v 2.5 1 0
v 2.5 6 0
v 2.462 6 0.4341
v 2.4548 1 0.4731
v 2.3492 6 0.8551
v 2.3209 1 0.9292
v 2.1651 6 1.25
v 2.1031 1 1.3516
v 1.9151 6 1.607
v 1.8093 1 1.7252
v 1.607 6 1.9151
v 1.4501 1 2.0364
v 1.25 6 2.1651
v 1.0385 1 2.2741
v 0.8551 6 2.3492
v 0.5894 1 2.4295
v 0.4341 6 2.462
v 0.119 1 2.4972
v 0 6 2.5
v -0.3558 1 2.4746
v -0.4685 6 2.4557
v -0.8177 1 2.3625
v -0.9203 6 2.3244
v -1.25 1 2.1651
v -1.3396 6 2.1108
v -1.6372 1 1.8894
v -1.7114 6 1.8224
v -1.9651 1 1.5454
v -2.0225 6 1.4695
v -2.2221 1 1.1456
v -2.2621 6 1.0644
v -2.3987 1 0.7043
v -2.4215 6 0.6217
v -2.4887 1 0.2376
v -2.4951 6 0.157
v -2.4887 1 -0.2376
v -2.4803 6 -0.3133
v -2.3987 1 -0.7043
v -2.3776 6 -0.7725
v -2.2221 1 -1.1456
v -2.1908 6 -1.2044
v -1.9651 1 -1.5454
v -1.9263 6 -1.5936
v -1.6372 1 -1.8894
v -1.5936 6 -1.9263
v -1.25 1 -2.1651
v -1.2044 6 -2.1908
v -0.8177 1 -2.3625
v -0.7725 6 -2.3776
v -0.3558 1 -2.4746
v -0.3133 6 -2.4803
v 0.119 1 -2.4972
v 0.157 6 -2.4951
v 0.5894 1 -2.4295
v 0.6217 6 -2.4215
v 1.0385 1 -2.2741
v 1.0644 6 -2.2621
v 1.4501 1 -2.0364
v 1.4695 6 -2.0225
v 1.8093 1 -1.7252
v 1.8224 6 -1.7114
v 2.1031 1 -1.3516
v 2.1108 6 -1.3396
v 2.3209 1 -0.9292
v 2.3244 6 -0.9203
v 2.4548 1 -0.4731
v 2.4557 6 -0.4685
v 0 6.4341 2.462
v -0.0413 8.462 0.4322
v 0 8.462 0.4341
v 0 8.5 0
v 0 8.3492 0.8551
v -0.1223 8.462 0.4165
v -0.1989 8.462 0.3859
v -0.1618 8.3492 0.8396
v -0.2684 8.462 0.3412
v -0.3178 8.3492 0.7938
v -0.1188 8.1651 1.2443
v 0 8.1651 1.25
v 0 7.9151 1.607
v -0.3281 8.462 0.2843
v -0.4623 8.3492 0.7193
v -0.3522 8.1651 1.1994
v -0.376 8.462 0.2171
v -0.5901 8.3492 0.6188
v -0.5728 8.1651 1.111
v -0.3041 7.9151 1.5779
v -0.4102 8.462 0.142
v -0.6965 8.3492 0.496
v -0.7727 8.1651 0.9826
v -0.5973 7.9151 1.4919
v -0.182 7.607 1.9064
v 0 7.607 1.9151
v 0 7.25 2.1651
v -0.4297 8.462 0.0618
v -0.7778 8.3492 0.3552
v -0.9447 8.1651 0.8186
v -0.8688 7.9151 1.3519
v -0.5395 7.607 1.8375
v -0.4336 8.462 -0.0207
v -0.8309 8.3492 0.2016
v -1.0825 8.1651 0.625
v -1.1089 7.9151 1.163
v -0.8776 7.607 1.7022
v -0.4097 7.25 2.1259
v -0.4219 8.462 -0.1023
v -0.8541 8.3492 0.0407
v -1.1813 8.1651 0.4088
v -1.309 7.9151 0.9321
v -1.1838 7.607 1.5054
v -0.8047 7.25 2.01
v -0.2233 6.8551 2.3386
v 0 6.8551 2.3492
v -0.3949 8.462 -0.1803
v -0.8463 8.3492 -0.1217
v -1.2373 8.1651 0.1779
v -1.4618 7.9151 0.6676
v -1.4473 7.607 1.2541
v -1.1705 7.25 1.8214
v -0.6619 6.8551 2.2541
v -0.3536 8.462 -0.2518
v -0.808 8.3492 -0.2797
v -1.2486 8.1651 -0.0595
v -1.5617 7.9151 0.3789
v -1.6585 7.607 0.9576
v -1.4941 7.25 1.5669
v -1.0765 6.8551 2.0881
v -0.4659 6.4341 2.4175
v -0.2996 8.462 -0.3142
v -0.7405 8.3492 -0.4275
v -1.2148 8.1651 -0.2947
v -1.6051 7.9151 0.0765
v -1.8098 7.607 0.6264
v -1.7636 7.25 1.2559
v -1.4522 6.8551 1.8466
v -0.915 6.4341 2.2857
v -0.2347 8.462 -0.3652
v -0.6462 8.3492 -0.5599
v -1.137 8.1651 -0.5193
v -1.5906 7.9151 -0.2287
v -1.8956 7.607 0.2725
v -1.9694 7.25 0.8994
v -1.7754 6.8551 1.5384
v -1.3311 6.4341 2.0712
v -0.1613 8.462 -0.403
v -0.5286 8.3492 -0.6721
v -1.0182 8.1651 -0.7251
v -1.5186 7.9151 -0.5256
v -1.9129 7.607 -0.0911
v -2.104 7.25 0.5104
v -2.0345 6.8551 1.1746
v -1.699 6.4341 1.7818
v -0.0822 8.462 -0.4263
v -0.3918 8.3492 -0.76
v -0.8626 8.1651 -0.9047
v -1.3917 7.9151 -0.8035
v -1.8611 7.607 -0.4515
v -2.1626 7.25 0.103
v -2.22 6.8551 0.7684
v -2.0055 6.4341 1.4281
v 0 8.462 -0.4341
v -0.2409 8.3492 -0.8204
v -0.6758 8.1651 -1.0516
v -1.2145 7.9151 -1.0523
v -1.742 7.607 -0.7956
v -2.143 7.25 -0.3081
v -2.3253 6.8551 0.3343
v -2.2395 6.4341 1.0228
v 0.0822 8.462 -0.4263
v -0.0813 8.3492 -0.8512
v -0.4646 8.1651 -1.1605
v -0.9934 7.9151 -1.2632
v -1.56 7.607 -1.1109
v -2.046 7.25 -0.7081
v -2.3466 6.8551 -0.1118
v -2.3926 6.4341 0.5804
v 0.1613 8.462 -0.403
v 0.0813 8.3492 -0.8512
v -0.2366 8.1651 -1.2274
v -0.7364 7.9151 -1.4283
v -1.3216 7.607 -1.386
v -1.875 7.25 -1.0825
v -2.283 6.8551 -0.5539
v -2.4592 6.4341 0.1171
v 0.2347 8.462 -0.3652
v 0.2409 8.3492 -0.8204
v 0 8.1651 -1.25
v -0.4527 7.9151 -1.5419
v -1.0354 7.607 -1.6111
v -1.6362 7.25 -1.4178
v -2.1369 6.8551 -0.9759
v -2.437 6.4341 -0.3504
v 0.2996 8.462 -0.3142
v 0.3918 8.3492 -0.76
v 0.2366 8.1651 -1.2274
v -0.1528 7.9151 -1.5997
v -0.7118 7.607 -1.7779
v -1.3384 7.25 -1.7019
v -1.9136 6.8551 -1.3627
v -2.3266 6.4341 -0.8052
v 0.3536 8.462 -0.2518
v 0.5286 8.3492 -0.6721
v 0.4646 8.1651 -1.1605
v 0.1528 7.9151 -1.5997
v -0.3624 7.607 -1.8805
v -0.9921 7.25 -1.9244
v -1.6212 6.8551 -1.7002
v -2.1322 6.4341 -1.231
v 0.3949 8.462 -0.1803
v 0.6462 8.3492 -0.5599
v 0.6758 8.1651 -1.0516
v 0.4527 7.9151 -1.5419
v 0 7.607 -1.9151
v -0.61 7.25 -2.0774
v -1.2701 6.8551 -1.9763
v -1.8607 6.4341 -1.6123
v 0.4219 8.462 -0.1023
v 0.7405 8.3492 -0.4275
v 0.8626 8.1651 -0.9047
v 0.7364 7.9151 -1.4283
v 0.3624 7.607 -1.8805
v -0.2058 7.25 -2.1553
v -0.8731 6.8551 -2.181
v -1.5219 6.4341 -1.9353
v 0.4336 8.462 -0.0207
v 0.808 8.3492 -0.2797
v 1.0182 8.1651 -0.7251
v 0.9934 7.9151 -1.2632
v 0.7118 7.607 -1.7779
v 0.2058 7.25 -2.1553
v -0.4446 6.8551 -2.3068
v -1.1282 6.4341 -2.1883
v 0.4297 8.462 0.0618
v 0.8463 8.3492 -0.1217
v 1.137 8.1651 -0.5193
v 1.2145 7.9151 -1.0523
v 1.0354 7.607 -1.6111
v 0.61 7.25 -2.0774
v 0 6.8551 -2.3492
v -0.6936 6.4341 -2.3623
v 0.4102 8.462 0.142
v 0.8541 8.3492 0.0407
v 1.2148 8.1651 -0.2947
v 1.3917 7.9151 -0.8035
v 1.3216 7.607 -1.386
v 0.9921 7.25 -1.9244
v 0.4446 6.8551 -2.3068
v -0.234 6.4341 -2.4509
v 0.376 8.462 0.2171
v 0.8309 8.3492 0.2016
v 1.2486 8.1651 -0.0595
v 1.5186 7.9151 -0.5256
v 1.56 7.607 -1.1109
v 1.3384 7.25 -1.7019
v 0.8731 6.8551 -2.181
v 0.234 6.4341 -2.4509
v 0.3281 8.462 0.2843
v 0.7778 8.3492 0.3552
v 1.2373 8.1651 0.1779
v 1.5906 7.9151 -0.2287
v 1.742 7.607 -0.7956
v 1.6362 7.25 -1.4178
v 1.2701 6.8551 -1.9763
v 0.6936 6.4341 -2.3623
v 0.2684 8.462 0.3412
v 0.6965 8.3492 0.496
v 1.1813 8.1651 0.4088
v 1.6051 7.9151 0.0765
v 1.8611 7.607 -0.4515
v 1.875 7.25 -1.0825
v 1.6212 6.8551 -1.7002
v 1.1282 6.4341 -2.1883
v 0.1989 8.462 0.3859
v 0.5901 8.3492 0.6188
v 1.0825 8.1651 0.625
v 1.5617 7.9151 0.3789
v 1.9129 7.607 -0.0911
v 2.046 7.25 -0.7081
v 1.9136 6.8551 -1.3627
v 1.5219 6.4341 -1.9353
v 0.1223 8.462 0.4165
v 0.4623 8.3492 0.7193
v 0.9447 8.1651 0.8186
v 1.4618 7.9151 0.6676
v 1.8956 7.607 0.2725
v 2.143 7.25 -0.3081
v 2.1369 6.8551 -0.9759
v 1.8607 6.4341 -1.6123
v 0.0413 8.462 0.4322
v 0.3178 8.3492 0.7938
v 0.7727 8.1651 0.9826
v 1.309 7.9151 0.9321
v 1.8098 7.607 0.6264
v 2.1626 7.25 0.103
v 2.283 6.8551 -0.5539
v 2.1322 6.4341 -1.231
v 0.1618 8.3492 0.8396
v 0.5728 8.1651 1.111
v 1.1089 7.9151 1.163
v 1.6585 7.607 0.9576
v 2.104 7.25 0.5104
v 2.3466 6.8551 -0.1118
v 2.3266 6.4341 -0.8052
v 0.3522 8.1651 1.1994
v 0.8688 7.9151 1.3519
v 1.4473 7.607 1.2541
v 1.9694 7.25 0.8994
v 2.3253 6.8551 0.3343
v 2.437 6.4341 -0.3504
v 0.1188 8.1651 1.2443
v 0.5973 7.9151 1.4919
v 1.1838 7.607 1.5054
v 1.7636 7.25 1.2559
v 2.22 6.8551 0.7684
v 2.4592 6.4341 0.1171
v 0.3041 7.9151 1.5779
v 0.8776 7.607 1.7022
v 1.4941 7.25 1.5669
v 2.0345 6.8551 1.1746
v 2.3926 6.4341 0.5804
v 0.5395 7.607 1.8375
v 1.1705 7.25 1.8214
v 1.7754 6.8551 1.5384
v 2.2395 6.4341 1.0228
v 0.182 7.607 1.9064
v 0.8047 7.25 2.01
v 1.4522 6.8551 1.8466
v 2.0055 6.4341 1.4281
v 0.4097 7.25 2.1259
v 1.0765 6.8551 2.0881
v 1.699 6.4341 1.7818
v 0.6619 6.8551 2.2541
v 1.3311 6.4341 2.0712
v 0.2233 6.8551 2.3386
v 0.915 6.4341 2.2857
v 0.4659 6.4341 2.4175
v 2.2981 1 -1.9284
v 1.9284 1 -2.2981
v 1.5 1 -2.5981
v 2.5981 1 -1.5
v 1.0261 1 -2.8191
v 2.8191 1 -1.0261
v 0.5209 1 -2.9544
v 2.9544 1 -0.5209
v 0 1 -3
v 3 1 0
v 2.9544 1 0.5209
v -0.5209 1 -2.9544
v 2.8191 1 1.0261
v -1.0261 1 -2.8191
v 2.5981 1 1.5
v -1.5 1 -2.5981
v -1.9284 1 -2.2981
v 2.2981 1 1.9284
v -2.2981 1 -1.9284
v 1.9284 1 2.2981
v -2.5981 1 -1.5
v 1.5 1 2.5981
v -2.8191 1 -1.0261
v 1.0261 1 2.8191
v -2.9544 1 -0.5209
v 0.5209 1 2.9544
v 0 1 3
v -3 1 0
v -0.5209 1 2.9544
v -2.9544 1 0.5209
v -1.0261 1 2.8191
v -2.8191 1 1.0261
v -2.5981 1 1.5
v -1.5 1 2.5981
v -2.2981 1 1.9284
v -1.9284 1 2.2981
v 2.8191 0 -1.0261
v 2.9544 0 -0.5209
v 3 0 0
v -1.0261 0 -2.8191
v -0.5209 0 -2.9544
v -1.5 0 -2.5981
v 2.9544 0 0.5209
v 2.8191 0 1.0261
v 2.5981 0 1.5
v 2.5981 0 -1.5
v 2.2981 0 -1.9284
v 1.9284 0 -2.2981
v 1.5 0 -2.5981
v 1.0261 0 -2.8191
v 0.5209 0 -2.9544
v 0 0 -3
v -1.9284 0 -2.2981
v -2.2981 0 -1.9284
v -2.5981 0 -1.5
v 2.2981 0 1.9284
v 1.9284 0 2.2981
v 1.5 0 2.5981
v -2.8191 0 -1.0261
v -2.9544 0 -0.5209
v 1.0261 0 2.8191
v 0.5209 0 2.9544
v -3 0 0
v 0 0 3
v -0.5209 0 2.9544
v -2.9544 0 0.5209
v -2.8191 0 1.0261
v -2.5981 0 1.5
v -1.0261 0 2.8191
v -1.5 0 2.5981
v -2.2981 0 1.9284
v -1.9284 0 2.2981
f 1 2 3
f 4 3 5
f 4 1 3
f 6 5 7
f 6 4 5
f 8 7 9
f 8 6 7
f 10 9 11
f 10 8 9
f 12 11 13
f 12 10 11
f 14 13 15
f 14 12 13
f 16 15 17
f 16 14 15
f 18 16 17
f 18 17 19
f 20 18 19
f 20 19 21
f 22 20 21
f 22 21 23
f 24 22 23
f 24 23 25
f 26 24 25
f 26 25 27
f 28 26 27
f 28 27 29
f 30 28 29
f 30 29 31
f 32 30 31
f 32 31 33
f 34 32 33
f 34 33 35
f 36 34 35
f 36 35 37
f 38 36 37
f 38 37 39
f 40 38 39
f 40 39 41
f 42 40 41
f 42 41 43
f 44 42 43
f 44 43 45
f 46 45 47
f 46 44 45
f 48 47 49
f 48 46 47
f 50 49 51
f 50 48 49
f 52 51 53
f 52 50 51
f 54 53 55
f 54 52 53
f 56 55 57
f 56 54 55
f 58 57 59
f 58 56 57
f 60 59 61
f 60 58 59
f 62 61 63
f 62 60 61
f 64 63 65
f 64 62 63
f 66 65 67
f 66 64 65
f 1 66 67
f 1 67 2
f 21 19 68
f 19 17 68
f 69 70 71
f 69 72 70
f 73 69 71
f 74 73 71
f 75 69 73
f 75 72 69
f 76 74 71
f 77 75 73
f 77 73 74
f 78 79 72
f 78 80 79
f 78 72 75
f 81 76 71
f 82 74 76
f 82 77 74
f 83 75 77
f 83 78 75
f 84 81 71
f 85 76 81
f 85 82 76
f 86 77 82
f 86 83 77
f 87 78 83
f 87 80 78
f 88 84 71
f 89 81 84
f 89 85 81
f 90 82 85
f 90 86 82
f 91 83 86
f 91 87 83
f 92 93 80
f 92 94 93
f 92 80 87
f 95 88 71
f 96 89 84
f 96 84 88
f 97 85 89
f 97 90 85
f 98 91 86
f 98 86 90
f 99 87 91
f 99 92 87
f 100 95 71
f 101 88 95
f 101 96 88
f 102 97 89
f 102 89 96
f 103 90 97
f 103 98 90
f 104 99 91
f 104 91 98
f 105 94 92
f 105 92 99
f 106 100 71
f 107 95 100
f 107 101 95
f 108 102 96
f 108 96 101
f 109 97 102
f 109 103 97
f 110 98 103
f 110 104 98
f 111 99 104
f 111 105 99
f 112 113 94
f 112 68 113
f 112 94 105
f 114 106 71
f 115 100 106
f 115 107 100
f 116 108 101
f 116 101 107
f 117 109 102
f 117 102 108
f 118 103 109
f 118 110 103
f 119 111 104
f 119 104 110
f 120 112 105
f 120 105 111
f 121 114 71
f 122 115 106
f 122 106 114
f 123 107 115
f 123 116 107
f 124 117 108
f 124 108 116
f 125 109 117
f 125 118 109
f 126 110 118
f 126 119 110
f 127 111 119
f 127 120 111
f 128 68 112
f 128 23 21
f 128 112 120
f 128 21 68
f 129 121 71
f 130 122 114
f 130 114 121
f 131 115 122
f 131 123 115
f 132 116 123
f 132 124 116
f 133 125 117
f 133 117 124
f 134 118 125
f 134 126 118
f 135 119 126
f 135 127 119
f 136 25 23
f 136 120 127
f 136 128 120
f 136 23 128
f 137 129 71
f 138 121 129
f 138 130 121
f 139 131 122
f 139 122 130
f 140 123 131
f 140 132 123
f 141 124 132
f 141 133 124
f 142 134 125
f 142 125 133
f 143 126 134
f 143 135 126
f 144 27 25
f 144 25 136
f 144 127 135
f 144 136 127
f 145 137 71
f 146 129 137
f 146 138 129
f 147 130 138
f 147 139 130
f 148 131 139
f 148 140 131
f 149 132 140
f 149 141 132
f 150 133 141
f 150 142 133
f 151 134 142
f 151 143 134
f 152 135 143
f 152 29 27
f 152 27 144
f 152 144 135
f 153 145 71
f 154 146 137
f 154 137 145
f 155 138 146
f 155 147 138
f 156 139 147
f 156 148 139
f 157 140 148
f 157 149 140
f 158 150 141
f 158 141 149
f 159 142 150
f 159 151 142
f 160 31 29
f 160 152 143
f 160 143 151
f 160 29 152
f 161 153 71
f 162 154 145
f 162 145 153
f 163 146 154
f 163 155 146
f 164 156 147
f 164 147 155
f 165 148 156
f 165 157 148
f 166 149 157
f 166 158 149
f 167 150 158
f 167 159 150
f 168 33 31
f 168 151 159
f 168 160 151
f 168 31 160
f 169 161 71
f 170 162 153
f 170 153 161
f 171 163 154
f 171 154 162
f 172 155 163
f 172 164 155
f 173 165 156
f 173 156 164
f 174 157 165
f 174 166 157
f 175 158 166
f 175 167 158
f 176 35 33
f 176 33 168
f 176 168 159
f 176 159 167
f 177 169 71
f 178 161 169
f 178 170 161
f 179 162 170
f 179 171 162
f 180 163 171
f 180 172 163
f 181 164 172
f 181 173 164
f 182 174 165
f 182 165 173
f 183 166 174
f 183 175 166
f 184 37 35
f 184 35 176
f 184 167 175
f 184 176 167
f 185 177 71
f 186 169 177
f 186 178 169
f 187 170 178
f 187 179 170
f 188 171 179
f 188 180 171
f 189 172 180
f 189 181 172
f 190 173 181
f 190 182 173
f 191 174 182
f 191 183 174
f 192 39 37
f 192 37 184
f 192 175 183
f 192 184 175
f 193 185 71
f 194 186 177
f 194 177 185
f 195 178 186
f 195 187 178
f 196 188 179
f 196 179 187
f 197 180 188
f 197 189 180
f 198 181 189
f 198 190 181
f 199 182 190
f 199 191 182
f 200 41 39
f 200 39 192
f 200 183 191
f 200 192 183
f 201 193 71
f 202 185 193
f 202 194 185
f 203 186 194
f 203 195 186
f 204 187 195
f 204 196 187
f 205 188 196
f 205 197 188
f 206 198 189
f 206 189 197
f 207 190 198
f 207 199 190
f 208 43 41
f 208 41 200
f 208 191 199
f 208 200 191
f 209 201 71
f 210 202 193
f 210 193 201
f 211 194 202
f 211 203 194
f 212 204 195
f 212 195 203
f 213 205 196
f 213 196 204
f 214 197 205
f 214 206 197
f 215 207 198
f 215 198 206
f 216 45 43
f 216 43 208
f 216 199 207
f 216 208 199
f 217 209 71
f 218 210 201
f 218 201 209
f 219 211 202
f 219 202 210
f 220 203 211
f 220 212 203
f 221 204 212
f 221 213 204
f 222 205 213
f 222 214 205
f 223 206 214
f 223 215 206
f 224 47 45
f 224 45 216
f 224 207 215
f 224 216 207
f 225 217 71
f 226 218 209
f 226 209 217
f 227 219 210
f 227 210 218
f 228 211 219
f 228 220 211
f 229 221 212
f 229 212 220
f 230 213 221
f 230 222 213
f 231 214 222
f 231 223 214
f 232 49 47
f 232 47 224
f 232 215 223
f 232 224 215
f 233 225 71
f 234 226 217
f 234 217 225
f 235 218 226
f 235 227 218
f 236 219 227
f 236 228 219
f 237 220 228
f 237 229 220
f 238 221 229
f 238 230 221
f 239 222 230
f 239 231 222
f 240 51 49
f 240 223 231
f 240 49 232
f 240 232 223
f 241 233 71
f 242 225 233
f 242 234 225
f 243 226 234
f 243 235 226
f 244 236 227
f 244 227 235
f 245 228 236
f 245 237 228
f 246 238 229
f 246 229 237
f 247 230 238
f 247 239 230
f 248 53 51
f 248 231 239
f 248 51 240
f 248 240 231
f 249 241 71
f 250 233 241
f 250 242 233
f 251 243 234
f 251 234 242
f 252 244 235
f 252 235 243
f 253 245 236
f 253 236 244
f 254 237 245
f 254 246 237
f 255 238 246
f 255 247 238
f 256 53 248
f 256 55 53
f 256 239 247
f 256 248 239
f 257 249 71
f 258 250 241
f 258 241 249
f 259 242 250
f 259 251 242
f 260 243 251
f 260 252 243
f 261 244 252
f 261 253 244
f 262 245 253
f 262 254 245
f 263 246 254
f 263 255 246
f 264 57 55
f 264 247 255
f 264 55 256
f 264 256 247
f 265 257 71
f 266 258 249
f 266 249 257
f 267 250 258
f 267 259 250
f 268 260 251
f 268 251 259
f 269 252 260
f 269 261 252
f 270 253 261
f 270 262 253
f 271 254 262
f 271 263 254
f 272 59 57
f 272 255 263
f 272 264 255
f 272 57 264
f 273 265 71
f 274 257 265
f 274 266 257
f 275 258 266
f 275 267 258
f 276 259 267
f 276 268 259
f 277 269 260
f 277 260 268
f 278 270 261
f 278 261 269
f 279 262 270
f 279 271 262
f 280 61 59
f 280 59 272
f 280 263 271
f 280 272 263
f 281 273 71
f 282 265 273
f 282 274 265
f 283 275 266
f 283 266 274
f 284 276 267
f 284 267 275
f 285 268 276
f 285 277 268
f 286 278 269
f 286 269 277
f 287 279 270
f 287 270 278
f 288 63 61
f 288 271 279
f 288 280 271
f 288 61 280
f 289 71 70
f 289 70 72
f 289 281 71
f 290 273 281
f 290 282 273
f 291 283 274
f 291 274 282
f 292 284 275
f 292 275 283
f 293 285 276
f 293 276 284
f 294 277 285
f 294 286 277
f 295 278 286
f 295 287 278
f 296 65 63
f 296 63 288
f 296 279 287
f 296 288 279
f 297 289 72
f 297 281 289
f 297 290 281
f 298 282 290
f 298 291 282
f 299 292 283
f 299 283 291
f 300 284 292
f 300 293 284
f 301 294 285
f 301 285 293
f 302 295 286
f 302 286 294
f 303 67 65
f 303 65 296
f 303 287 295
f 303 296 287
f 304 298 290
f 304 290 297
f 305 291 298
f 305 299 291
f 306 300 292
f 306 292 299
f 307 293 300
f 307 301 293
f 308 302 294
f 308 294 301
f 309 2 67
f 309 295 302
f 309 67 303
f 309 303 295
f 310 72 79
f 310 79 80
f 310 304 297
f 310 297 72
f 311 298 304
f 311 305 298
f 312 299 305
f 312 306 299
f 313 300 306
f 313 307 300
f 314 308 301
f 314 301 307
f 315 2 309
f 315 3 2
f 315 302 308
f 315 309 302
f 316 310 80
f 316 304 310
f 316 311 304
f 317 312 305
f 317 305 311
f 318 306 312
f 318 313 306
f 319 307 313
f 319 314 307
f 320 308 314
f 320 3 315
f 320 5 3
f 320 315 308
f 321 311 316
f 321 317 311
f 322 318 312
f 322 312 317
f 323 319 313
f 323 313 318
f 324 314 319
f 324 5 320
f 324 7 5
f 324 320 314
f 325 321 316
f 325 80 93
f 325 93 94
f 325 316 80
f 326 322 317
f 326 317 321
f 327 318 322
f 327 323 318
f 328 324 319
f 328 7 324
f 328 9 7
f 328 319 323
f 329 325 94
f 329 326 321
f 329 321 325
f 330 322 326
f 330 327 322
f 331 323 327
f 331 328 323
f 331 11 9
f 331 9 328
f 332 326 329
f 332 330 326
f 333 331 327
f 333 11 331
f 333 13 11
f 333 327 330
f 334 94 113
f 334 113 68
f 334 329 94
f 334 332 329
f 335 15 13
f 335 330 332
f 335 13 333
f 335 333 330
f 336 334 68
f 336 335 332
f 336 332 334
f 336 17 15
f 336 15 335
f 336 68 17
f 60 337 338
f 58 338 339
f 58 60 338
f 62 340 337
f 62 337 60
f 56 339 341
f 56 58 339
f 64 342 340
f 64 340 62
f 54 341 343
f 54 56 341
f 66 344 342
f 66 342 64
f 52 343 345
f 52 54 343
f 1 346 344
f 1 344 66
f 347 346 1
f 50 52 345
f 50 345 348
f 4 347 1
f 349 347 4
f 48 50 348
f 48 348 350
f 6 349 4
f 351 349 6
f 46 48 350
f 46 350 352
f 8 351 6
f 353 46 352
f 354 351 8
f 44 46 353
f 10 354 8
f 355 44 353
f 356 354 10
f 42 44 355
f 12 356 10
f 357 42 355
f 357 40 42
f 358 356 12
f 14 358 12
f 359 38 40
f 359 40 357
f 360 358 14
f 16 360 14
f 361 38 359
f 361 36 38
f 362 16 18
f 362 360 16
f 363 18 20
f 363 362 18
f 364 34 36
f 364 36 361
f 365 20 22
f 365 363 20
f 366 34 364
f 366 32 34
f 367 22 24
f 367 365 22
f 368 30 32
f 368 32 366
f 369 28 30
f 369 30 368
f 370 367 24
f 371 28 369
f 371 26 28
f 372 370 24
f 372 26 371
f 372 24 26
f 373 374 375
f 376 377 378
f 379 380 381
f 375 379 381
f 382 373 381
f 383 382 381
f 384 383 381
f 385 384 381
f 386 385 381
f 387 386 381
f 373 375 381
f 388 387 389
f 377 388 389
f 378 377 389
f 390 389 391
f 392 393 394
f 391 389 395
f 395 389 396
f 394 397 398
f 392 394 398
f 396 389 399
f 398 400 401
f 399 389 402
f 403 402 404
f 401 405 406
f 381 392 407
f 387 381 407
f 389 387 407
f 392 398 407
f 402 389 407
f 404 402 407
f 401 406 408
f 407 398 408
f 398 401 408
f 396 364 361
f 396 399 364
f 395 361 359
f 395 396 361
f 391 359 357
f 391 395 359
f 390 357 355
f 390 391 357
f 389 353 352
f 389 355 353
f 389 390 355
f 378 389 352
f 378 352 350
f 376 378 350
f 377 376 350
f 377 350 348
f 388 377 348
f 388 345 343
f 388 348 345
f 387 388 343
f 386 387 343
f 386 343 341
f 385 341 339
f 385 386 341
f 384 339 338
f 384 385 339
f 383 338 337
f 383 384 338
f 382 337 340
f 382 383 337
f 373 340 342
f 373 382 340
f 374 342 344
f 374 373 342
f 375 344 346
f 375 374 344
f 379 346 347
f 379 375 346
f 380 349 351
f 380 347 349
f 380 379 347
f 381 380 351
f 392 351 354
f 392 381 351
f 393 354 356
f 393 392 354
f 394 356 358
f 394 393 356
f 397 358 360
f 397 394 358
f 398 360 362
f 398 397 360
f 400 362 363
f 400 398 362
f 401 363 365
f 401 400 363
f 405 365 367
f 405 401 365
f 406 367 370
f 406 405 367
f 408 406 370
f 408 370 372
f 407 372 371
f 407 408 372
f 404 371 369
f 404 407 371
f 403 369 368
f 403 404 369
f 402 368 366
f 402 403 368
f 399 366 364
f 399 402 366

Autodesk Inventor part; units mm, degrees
ref_plane "YZ Plane" through (0, 0, 0) normal (1, 0, 0) x (0, 1, 0)
ref_plane "XZ Plane" through (0, 0, 0) normal (0, 1, 0) x (-1, 0, 0)
ref_plane "XY Plane" through (0, 0, 0) normal (0, 0, 1) x (1, 0, 0)
sketch "Sketch1" plane through (0, 0, 0) normal (0, 1, 0) x (-1, 0, 0)
  circle A0 centre (0, 0) radius 3
  dimension "d0" = 6
extrude "Extrusion1" add sketch "Sketch1" along normal blind 1
sketch "Sketch2" plane through (0, 1, 0) normal (0, 1, 0) x (1, 0, 0)
  circle A0 centre (0, 0) radius 2.5
  dimension "d3" = 5
extrude "Extrusion2" add sketch "Sketch2" along normal blind 5
sketch "Sketch4" plane through (0, 0, 0) normal (1, 0, 0) x (0, 1, 0)
  line L0 (6, -2.5) -> (6, 2.5) projected
  line L1 (1, 2.5) -> (1, -2.5) projected
  line L2 (1, 2.5) -> (6, 2.5) projected
  line L3 (6, -2.5) -> (6, 2.5) projected
  arc A0 (8.5, 0) -> (6, 2.5) centre (6, 0) ccw
  line L4 (8.5, 0) -> (6, 0)
  point P0 (0, 0)
revolve "Revolution1" add sketch "Sketch4" angle 360 about axis through (0, 8.5, 0) along (0, -1, 0)
properties part number "LED5mm" material "Glass"
